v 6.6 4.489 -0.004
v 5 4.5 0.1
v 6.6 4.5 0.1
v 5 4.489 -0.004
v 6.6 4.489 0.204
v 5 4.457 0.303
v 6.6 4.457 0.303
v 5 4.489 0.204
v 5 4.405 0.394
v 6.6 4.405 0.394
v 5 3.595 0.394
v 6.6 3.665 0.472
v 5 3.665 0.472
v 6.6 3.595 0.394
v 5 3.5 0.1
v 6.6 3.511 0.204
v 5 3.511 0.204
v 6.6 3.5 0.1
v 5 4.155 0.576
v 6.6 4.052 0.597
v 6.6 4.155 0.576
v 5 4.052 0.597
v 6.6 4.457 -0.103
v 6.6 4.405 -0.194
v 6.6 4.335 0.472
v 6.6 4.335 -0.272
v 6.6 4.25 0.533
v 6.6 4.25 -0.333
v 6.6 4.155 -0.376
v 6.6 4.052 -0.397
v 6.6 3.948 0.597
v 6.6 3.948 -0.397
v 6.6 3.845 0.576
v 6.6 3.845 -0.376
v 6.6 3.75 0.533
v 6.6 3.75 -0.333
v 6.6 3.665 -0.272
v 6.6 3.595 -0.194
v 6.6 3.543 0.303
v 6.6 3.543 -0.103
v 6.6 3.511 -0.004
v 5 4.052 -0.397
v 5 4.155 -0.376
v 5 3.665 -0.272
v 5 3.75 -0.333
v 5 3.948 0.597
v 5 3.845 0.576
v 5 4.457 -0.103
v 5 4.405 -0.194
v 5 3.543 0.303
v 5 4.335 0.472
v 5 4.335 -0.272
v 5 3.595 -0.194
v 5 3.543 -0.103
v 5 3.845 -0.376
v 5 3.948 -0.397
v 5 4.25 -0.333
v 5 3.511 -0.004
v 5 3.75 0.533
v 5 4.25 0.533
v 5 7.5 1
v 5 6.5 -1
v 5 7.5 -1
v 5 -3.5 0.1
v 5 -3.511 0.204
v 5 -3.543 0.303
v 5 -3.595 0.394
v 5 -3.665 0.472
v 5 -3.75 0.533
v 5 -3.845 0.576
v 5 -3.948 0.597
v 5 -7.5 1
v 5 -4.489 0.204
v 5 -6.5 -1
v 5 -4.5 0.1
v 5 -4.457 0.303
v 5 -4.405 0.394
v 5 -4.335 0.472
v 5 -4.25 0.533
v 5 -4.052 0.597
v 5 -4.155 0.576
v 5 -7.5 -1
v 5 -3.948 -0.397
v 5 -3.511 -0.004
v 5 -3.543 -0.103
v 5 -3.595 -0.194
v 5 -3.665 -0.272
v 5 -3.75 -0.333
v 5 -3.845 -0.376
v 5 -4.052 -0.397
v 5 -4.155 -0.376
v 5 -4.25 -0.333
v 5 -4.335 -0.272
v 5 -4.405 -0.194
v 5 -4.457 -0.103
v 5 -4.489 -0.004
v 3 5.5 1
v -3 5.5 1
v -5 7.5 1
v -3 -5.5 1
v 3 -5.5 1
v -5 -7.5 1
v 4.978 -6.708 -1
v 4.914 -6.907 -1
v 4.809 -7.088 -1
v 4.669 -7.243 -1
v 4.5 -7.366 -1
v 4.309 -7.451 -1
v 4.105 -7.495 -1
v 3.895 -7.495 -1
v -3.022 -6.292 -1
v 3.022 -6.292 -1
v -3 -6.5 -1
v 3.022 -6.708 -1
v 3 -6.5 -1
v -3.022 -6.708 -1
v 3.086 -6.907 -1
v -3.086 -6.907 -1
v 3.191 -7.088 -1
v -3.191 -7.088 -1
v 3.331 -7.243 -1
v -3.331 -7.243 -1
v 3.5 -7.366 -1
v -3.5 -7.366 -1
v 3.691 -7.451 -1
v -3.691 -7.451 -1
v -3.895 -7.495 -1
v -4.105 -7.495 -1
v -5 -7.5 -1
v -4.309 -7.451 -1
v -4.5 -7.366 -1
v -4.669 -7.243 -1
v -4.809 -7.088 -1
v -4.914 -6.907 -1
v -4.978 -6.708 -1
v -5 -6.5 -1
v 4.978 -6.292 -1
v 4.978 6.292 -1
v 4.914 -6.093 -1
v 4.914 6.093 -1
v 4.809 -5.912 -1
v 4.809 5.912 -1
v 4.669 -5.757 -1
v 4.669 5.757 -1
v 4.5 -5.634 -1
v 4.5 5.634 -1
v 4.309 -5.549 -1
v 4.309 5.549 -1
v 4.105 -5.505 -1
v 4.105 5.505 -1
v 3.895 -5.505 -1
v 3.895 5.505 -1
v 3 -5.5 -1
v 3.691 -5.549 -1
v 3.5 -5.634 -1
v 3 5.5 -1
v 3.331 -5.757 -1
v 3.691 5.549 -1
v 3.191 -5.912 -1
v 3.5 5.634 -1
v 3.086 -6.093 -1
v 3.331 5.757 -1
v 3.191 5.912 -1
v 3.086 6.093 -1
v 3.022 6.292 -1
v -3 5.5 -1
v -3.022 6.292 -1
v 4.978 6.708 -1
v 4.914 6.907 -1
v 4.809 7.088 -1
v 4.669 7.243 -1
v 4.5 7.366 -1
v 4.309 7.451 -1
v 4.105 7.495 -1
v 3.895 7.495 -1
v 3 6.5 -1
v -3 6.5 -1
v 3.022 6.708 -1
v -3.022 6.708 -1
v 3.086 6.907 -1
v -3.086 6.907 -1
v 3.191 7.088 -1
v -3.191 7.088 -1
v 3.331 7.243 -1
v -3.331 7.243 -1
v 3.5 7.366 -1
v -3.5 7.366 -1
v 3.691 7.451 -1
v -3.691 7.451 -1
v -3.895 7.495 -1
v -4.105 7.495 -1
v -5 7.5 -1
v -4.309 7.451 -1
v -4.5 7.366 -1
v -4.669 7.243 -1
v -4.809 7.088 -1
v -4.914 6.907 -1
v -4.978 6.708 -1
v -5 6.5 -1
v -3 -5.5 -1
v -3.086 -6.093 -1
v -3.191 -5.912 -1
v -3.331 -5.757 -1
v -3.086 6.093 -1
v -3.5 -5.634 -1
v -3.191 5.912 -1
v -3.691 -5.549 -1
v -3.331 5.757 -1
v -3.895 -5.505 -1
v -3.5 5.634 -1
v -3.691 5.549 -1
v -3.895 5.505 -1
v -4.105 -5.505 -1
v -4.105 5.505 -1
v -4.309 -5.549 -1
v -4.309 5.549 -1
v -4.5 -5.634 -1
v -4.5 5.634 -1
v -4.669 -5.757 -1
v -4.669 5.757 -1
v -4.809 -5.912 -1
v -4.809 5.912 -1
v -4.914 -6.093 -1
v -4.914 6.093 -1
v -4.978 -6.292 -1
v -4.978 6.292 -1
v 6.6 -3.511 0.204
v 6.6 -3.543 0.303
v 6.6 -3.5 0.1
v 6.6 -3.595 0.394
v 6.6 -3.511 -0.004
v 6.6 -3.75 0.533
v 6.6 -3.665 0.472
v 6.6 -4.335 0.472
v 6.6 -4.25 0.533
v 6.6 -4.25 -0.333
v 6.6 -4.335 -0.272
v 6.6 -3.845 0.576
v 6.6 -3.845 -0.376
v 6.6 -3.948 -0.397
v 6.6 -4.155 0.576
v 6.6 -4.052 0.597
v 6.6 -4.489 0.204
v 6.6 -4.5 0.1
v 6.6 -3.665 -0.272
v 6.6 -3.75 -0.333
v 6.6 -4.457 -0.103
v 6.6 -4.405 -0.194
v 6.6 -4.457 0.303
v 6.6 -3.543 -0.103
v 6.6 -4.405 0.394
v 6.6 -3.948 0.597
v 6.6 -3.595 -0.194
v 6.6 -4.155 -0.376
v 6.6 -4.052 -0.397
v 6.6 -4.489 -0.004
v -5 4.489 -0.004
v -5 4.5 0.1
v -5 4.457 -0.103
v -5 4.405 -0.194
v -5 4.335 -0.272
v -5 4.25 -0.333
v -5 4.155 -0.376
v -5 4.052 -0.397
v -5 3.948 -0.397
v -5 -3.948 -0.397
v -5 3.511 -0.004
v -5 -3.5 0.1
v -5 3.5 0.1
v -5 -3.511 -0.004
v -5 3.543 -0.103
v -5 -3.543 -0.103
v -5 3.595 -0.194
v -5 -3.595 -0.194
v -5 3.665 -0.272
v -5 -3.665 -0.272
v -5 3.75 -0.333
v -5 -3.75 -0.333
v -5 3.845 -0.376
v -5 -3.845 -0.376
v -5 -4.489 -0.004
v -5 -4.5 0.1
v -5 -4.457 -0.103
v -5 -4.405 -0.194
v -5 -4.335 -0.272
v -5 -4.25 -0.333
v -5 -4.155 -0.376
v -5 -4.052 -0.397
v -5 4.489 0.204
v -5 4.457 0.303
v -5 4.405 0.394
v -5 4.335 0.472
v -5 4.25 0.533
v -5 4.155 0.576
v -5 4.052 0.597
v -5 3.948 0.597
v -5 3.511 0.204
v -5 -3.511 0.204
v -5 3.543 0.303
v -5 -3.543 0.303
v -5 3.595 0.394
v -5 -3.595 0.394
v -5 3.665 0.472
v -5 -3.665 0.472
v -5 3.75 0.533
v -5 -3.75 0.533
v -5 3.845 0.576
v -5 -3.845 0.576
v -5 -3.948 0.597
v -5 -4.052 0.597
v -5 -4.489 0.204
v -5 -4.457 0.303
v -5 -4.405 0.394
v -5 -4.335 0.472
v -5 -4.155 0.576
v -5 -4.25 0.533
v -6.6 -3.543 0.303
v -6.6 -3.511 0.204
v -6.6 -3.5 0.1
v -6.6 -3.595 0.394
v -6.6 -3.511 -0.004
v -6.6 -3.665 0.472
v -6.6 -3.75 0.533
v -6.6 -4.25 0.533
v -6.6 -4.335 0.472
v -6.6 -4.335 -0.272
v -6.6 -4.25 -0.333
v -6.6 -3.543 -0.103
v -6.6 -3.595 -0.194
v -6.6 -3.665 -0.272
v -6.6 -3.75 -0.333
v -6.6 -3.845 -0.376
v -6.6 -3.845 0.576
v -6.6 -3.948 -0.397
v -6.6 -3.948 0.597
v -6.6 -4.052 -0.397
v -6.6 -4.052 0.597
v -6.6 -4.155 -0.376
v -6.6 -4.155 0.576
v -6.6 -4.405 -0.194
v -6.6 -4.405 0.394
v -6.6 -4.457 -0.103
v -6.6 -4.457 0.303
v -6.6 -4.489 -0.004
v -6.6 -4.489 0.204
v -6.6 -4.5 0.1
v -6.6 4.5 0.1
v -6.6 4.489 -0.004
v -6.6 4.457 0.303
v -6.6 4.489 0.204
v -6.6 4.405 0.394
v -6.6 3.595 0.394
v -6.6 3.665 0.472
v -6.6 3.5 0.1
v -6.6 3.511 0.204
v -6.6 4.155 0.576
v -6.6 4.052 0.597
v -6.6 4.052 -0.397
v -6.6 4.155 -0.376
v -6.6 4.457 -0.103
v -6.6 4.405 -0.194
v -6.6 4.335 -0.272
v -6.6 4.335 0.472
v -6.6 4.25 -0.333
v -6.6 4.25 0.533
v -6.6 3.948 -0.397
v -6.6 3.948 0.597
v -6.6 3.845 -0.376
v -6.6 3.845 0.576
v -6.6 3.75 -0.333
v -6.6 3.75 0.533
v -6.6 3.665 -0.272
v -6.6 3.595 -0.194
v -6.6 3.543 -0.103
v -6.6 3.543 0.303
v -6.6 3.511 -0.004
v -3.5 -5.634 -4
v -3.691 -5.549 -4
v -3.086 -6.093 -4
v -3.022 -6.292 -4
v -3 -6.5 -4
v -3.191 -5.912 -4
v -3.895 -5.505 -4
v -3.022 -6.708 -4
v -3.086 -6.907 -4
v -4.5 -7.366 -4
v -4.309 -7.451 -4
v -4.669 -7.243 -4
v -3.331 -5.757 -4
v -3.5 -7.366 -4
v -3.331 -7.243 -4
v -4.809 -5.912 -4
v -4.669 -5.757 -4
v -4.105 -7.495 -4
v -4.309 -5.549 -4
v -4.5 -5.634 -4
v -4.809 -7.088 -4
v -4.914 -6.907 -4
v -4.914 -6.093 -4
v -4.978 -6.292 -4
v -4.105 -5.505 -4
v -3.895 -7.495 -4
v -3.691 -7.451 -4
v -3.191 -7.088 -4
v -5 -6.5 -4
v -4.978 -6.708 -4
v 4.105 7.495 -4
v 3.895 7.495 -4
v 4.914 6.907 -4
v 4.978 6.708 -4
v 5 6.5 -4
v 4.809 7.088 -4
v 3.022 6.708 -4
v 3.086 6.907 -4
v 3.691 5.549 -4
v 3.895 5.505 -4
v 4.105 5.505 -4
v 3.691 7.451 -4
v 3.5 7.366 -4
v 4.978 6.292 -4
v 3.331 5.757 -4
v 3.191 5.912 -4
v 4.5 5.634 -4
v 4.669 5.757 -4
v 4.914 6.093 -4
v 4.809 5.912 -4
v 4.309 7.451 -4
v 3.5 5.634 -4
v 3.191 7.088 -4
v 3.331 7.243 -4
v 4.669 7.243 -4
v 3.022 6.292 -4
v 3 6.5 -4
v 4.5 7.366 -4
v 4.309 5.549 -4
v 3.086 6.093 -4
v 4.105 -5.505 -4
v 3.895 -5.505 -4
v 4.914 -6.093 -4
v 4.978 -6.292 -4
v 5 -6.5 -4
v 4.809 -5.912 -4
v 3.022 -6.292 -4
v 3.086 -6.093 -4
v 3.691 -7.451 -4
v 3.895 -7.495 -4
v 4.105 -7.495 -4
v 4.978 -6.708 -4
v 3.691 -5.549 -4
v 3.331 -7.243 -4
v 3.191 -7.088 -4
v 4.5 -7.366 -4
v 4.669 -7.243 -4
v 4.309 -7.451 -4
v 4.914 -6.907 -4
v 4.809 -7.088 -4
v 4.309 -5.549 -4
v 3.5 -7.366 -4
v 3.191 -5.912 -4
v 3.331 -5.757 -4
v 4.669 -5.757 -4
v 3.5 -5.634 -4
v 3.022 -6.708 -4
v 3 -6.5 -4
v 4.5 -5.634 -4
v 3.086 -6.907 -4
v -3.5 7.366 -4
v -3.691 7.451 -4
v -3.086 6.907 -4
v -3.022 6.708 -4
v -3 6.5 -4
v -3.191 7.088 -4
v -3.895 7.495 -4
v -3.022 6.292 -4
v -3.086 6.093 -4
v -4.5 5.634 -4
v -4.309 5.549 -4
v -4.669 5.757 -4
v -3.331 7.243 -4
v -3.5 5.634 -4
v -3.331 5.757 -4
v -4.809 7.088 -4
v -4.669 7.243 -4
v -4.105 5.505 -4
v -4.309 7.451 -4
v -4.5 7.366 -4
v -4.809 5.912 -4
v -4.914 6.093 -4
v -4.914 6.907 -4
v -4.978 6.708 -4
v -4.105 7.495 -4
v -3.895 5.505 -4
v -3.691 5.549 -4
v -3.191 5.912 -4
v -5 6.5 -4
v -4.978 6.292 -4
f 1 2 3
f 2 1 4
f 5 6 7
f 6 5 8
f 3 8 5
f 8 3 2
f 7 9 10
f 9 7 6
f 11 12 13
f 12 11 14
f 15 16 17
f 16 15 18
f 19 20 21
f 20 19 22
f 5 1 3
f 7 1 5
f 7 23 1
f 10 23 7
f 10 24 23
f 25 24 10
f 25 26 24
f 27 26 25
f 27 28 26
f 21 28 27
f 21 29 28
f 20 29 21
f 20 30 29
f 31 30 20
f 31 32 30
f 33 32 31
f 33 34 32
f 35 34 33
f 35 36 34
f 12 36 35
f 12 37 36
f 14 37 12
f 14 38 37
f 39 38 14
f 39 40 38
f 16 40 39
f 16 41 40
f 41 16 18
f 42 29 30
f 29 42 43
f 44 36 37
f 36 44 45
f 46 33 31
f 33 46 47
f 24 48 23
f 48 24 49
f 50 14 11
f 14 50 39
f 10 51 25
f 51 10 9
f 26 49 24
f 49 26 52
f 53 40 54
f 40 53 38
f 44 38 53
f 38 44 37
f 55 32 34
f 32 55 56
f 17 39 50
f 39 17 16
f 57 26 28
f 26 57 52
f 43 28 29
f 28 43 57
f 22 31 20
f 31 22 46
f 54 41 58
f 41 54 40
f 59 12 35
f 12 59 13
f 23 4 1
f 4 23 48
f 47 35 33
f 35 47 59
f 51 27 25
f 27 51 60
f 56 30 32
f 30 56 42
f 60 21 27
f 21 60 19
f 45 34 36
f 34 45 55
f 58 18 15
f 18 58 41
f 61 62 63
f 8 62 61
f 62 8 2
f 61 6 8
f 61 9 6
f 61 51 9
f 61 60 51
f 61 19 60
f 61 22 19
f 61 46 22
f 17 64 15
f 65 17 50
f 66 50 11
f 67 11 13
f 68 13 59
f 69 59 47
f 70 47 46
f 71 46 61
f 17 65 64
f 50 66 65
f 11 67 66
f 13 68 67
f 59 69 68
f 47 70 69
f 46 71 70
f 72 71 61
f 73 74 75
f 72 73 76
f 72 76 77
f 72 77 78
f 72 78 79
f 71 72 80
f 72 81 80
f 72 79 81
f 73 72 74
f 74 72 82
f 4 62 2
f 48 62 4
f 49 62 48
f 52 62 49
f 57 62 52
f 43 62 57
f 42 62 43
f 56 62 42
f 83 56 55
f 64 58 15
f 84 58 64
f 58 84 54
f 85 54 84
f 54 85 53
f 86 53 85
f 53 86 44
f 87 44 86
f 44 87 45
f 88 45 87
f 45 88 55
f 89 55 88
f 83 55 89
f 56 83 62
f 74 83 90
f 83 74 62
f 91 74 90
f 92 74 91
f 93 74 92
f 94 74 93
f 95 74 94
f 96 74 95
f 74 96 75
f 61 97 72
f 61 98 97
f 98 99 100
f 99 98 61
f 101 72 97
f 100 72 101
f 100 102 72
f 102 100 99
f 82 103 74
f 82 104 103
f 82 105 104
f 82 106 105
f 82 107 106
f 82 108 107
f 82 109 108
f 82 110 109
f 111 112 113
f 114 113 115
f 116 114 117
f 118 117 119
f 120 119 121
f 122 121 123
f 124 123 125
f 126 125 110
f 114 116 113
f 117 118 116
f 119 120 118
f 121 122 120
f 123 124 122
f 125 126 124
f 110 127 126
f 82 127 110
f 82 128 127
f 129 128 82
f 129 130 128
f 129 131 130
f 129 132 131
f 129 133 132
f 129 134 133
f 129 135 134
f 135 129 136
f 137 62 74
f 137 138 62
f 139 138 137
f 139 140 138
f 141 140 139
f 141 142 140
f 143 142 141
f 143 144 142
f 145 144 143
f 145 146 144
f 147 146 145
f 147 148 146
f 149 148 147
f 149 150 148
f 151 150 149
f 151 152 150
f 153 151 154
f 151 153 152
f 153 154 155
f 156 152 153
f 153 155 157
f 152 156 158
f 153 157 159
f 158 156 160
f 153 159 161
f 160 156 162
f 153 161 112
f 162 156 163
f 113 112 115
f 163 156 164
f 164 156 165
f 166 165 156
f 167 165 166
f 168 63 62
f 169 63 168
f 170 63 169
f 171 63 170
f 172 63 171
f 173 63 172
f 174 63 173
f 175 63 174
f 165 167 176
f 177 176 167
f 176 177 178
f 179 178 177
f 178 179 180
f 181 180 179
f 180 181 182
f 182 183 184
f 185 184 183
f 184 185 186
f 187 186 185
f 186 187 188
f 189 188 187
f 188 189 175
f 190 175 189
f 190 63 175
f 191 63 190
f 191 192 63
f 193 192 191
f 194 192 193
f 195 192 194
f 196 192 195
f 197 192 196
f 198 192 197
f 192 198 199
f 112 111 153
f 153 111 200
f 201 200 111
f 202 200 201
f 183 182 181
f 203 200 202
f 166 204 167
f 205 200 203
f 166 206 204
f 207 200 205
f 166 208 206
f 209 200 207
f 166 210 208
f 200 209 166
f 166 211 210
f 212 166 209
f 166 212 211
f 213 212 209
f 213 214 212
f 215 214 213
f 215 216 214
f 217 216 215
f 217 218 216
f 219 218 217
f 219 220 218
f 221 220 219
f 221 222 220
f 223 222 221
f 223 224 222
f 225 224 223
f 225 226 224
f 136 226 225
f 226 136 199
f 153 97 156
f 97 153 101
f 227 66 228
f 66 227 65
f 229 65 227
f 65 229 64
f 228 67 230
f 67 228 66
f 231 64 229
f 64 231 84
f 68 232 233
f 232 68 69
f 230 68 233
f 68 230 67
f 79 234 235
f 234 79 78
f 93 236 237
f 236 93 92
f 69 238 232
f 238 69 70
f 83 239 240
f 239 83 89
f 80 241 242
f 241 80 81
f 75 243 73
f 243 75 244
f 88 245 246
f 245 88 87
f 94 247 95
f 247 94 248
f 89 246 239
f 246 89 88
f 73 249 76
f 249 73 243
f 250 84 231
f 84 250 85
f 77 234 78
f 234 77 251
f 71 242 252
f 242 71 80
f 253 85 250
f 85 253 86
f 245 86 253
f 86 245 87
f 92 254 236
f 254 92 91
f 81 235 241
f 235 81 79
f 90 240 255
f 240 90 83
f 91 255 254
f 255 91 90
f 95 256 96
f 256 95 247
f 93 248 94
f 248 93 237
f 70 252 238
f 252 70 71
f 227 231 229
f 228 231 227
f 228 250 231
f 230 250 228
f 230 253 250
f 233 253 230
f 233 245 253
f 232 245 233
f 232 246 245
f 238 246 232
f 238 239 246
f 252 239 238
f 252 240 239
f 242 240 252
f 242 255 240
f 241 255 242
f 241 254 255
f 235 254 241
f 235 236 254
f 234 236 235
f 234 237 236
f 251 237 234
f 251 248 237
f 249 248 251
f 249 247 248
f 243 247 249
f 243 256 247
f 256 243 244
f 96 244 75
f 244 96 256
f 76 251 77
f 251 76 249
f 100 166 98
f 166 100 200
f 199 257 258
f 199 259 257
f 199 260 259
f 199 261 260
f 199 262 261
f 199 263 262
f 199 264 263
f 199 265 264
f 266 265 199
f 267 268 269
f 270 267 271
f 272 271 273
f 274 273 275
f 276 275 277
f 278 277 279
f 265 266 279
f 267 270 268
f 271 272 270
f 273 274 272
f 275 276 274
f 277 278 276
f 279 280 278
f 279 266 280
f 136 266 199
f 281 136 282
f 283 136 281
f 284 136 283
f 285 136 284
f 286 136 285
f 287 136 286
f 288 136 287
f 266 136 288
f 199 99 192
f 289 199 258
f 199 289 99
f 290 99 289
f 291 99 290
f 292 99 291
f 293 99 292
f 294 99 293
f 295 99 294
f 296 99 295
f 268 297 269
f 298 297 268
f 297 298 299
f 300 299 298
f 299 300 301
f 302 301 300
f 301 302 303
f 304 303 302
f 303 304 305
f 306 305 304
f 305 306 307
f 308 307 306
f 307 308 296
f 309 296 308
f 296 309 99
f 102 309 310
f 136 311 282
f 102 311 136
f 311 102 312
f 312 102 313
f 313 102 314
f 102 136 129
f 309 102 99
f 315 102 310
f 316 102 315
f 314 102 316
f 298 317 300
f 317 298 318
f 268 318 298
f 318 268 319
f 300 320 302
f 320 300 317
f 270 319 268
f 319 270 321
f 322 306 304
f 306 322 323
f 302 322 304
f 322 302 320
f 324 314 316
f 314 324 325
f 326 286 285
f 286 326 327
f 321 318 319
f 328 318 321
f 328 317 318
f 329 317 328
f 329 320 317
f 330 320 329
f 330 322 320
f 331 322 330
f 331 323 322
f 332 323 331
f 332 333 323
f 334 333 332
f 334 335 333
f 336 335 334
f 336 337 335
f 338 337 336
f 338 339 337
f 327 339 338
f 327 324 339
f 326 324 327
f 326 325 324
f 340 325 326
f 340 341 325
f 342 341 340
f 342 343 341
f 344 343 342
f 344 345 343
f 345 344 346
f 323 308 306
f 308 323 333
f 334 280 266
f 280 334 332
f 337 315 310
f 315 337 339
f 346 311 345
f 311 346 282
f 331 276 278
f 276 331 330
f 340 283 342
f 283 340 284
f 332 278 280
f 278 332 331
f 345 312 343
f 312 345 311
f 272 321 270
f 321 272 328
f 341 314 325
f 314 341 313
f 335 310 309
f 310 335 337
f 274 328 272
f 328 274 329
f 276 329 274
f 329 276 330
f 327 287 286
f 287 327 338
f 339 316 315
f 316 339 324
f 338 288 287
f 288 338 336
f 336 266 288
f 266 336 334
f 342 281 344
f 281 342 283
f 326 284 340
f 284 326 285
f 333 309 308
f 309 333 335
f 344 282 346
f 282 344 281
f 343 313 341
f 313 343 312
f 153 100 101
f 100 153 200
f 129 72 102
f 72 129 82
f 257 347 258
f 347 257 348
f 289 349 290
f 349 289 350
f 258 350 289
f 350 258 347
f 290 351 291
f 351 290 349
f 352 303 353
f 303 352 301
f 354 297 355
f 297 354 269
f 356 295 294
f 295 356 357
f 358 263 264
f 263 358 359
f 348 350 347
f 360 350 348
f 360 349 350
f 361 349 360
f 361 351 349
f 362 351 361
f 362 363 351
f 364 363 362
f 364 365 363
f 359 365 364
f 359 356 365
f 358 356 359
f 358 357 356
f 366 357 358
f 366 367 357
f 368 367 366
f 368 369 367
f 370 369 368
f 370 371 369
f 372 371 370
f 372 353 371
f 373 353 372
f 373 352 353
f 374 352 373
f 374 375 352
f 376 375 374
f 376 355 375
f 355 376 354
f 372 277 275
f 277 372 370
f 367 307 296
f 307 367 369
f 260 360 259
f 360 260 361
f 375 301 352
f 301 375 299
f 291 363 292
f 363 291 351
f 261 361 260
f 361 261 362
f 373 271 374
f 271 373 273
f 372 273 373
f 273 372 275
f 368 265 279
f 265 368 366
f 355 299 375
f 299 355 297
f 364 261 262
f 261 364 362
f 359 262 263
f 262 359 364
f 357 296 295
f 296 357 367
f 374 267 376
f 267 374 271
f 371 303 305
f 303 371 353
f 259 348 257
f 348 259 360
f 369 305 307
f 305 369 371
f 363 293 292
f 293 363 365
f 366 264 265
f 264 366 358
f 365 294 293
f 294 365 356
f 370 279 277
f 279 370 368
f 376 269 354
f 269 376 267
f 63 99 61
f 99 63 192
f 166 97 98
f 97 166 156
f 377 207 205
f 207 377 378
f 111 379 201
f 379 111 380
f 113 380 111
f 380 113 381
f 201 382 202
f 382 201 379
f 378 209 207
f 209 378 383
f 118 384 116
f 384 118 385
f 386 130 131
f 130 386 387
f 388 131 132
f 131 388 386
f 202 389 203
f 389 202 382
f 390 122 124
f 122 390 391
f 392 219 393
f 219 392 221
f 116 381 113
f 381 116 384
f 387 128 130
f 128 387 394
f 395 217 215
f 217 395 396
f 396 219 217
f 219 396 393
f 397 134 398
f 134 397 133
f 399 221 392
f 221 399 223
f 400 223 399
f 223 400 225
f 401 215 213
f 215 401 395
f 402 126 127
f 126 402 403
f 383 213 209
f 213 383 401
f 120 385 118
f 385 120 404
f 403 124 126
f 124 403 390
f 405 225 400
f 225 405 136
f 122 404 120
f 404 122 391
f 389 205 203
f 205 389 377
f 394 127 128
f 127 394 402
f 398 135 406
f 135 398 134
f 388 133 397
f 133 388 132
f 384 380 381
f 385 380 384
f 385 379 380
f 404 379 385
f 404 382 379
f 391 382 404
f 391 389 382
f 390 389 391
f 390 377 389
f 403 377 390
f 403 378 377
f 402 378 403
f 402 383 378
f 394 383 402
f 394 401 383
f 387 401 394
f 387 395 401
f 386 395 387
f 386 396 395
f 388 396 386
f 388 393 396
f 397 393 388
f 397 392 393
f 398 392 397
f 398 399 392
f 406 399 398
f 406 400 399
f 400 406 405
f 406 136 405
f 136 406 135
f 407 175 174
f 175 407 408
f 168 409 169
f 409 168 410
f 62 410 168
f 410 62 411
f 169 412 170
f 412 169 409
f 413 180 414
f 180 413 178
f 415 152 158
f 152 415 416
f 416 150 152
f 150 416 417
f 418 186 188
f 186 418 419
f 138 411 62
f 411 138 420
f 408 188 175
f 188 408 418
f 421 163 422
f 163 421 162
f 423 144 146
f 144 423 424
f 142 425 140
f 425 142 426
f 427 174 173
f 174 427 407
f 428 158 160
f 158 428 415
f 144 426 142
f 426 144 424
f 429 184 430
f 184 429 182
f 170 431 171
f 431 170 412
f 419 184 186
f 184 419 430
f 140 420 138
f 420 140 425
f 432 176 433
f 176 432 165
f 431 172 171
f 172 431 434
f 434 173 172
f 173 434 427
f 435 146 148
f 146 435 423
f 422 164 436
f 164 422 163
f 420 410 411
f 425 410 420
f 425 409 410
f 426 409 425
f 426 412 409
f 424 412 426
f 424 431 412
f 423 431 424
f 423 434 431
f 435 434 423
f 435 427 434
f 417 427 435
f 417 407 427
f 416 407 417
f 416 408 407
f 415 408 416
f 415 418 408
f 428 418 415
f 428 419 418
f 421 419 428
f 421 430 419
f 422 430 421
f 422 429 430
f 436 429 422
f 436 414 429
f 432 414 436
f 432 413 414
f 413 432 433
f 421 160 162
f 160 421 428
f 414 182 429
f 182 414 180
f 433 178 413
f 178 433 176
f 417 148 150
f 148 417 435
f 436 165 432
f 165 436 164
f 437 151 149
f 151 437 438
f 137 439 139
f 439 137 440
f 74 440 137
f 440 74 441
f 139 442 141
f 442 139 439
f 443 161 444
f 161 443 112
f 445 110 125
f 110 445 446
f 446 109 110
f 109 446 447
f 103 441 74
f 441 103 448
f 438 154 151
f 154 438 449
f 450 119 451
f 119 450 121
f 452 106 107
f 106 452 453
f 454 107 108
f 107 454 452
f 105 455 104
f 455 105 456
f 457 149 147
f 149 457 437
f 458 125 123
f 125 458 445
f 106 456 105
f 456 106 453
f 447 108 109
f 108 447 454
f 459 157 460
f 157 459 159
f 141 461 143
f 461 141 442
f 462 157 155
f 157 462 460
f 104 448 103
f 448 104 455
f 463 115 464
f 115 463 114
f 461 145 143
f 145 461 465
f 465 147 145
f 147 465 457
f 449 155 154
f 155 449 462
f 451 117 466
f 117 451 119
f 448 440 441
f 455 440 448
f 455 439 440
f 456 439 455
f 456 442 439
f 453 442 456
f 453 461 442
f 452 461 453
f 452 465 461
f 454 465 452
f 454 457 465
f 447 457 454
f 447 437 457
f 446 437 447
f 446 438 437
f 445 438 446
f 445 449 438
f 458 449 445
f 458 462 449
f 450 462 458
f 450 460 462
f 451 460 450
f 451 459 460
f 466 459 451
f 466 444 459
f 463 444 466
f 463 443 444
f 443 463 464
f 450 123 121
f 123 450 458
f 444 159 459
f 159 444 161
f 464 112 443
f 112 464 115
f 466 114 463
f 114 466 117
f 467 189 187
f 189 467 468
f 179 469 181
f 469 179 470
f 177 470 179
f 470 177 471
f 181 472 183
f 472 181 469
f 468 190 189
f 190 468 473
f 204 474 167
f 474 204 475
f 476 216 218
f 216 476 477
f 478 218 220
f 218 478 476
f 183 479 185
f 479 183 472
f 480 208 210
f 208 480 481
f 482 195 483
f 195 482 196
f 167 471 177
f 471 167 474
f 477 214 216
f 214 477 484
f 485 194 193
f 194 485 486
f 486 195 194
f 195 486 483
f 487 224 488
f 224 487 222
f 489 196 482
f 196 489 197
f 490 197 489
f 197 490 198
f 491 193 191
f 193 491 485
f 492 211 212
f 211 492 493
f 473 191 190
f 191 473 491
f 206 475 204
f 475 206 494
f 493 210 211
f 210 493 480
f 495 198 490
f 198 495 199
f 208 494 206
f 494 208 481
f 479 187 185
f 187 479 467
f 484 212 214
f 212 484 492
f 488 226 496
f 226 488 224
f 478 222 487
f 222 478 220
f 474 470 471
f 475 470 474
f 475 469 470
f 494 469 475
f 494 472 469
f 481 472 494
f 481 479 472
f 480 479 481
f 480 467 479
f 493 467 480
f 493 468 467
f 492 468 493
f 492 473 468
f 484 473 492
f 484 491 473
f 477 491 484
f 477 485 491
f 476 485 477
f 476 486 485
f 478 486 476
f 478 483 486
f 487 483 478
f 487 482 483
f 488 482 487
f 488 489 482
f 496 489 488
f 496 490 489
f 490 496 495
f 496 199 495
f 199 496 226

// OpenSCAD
// le cadre du milieu avec avec les connecteurs sur les côté (2 sur chaque)
// Middle piece with connectors on the side (2 each)
// côté droite(longeur)avec un connecteur (extrême droite)   
//righ side legth with connector (far right)
union () 					{
rotate(a=120,v=[1,1,1])translate([4,0.1,4])cylinder(r=0.5,h=2.6);
translate([4,0,0]) {
cube(size=[2,13,2],center=true);
		}
// côté gauche (longeur)avec la deuxième connecteur (droite)
//left side legth with seconde connector (right) 
rotate(a=120,v=[1,1,1])translate([-4,0.1,4])cylinder(r=0.5,h=2.6);
translate([-4,0,0]){								
cube(size=[2,13,2], center=true);
		}		
// largeur(vers l'avant)avec la trosième connecteur (gauche)
// Width (front) with third connecteur (left)
rotate(a=120,v=[1,1,1])translate([-4,0.1,-6.6])cylinder(r=0.5,h=2.6);
translate([0,-6.5,0]){
cube(size=[10,2,2],center=true);
		}
// largeur (vers l'arrière) avec quatrième connecteur (extreme gauche) 
// Width (back) with fourth connector (far left)
rotate(a=120,v=[1,1,1])translate([4,0.1,-6.6])cylinder(r=0.5,h=2.6);
translate([0,6.5,0]){
cube(size=[10,2,2],center=true);
		}

								}

// Jambe gauche
// left leg
$fn=30;
translate([-4,-6.5,-4]){
cylinder(h=3,l=10);
		}

// Jambe extrême droite
// far right leg
$fn=30;
translate([4,6.5,-4]){
cylinder(h=3,l=10);
		}

// Jambe droite
//right leg
$fn=30;
translate([4,-6.5,-4]){
cylinder(h=3,l=10);
		}

//Jambe extrême gauche
//far left leg
$fn=30;
translate([-4,6.5,-4]){
cylinder(h=3,l=10);
		}
